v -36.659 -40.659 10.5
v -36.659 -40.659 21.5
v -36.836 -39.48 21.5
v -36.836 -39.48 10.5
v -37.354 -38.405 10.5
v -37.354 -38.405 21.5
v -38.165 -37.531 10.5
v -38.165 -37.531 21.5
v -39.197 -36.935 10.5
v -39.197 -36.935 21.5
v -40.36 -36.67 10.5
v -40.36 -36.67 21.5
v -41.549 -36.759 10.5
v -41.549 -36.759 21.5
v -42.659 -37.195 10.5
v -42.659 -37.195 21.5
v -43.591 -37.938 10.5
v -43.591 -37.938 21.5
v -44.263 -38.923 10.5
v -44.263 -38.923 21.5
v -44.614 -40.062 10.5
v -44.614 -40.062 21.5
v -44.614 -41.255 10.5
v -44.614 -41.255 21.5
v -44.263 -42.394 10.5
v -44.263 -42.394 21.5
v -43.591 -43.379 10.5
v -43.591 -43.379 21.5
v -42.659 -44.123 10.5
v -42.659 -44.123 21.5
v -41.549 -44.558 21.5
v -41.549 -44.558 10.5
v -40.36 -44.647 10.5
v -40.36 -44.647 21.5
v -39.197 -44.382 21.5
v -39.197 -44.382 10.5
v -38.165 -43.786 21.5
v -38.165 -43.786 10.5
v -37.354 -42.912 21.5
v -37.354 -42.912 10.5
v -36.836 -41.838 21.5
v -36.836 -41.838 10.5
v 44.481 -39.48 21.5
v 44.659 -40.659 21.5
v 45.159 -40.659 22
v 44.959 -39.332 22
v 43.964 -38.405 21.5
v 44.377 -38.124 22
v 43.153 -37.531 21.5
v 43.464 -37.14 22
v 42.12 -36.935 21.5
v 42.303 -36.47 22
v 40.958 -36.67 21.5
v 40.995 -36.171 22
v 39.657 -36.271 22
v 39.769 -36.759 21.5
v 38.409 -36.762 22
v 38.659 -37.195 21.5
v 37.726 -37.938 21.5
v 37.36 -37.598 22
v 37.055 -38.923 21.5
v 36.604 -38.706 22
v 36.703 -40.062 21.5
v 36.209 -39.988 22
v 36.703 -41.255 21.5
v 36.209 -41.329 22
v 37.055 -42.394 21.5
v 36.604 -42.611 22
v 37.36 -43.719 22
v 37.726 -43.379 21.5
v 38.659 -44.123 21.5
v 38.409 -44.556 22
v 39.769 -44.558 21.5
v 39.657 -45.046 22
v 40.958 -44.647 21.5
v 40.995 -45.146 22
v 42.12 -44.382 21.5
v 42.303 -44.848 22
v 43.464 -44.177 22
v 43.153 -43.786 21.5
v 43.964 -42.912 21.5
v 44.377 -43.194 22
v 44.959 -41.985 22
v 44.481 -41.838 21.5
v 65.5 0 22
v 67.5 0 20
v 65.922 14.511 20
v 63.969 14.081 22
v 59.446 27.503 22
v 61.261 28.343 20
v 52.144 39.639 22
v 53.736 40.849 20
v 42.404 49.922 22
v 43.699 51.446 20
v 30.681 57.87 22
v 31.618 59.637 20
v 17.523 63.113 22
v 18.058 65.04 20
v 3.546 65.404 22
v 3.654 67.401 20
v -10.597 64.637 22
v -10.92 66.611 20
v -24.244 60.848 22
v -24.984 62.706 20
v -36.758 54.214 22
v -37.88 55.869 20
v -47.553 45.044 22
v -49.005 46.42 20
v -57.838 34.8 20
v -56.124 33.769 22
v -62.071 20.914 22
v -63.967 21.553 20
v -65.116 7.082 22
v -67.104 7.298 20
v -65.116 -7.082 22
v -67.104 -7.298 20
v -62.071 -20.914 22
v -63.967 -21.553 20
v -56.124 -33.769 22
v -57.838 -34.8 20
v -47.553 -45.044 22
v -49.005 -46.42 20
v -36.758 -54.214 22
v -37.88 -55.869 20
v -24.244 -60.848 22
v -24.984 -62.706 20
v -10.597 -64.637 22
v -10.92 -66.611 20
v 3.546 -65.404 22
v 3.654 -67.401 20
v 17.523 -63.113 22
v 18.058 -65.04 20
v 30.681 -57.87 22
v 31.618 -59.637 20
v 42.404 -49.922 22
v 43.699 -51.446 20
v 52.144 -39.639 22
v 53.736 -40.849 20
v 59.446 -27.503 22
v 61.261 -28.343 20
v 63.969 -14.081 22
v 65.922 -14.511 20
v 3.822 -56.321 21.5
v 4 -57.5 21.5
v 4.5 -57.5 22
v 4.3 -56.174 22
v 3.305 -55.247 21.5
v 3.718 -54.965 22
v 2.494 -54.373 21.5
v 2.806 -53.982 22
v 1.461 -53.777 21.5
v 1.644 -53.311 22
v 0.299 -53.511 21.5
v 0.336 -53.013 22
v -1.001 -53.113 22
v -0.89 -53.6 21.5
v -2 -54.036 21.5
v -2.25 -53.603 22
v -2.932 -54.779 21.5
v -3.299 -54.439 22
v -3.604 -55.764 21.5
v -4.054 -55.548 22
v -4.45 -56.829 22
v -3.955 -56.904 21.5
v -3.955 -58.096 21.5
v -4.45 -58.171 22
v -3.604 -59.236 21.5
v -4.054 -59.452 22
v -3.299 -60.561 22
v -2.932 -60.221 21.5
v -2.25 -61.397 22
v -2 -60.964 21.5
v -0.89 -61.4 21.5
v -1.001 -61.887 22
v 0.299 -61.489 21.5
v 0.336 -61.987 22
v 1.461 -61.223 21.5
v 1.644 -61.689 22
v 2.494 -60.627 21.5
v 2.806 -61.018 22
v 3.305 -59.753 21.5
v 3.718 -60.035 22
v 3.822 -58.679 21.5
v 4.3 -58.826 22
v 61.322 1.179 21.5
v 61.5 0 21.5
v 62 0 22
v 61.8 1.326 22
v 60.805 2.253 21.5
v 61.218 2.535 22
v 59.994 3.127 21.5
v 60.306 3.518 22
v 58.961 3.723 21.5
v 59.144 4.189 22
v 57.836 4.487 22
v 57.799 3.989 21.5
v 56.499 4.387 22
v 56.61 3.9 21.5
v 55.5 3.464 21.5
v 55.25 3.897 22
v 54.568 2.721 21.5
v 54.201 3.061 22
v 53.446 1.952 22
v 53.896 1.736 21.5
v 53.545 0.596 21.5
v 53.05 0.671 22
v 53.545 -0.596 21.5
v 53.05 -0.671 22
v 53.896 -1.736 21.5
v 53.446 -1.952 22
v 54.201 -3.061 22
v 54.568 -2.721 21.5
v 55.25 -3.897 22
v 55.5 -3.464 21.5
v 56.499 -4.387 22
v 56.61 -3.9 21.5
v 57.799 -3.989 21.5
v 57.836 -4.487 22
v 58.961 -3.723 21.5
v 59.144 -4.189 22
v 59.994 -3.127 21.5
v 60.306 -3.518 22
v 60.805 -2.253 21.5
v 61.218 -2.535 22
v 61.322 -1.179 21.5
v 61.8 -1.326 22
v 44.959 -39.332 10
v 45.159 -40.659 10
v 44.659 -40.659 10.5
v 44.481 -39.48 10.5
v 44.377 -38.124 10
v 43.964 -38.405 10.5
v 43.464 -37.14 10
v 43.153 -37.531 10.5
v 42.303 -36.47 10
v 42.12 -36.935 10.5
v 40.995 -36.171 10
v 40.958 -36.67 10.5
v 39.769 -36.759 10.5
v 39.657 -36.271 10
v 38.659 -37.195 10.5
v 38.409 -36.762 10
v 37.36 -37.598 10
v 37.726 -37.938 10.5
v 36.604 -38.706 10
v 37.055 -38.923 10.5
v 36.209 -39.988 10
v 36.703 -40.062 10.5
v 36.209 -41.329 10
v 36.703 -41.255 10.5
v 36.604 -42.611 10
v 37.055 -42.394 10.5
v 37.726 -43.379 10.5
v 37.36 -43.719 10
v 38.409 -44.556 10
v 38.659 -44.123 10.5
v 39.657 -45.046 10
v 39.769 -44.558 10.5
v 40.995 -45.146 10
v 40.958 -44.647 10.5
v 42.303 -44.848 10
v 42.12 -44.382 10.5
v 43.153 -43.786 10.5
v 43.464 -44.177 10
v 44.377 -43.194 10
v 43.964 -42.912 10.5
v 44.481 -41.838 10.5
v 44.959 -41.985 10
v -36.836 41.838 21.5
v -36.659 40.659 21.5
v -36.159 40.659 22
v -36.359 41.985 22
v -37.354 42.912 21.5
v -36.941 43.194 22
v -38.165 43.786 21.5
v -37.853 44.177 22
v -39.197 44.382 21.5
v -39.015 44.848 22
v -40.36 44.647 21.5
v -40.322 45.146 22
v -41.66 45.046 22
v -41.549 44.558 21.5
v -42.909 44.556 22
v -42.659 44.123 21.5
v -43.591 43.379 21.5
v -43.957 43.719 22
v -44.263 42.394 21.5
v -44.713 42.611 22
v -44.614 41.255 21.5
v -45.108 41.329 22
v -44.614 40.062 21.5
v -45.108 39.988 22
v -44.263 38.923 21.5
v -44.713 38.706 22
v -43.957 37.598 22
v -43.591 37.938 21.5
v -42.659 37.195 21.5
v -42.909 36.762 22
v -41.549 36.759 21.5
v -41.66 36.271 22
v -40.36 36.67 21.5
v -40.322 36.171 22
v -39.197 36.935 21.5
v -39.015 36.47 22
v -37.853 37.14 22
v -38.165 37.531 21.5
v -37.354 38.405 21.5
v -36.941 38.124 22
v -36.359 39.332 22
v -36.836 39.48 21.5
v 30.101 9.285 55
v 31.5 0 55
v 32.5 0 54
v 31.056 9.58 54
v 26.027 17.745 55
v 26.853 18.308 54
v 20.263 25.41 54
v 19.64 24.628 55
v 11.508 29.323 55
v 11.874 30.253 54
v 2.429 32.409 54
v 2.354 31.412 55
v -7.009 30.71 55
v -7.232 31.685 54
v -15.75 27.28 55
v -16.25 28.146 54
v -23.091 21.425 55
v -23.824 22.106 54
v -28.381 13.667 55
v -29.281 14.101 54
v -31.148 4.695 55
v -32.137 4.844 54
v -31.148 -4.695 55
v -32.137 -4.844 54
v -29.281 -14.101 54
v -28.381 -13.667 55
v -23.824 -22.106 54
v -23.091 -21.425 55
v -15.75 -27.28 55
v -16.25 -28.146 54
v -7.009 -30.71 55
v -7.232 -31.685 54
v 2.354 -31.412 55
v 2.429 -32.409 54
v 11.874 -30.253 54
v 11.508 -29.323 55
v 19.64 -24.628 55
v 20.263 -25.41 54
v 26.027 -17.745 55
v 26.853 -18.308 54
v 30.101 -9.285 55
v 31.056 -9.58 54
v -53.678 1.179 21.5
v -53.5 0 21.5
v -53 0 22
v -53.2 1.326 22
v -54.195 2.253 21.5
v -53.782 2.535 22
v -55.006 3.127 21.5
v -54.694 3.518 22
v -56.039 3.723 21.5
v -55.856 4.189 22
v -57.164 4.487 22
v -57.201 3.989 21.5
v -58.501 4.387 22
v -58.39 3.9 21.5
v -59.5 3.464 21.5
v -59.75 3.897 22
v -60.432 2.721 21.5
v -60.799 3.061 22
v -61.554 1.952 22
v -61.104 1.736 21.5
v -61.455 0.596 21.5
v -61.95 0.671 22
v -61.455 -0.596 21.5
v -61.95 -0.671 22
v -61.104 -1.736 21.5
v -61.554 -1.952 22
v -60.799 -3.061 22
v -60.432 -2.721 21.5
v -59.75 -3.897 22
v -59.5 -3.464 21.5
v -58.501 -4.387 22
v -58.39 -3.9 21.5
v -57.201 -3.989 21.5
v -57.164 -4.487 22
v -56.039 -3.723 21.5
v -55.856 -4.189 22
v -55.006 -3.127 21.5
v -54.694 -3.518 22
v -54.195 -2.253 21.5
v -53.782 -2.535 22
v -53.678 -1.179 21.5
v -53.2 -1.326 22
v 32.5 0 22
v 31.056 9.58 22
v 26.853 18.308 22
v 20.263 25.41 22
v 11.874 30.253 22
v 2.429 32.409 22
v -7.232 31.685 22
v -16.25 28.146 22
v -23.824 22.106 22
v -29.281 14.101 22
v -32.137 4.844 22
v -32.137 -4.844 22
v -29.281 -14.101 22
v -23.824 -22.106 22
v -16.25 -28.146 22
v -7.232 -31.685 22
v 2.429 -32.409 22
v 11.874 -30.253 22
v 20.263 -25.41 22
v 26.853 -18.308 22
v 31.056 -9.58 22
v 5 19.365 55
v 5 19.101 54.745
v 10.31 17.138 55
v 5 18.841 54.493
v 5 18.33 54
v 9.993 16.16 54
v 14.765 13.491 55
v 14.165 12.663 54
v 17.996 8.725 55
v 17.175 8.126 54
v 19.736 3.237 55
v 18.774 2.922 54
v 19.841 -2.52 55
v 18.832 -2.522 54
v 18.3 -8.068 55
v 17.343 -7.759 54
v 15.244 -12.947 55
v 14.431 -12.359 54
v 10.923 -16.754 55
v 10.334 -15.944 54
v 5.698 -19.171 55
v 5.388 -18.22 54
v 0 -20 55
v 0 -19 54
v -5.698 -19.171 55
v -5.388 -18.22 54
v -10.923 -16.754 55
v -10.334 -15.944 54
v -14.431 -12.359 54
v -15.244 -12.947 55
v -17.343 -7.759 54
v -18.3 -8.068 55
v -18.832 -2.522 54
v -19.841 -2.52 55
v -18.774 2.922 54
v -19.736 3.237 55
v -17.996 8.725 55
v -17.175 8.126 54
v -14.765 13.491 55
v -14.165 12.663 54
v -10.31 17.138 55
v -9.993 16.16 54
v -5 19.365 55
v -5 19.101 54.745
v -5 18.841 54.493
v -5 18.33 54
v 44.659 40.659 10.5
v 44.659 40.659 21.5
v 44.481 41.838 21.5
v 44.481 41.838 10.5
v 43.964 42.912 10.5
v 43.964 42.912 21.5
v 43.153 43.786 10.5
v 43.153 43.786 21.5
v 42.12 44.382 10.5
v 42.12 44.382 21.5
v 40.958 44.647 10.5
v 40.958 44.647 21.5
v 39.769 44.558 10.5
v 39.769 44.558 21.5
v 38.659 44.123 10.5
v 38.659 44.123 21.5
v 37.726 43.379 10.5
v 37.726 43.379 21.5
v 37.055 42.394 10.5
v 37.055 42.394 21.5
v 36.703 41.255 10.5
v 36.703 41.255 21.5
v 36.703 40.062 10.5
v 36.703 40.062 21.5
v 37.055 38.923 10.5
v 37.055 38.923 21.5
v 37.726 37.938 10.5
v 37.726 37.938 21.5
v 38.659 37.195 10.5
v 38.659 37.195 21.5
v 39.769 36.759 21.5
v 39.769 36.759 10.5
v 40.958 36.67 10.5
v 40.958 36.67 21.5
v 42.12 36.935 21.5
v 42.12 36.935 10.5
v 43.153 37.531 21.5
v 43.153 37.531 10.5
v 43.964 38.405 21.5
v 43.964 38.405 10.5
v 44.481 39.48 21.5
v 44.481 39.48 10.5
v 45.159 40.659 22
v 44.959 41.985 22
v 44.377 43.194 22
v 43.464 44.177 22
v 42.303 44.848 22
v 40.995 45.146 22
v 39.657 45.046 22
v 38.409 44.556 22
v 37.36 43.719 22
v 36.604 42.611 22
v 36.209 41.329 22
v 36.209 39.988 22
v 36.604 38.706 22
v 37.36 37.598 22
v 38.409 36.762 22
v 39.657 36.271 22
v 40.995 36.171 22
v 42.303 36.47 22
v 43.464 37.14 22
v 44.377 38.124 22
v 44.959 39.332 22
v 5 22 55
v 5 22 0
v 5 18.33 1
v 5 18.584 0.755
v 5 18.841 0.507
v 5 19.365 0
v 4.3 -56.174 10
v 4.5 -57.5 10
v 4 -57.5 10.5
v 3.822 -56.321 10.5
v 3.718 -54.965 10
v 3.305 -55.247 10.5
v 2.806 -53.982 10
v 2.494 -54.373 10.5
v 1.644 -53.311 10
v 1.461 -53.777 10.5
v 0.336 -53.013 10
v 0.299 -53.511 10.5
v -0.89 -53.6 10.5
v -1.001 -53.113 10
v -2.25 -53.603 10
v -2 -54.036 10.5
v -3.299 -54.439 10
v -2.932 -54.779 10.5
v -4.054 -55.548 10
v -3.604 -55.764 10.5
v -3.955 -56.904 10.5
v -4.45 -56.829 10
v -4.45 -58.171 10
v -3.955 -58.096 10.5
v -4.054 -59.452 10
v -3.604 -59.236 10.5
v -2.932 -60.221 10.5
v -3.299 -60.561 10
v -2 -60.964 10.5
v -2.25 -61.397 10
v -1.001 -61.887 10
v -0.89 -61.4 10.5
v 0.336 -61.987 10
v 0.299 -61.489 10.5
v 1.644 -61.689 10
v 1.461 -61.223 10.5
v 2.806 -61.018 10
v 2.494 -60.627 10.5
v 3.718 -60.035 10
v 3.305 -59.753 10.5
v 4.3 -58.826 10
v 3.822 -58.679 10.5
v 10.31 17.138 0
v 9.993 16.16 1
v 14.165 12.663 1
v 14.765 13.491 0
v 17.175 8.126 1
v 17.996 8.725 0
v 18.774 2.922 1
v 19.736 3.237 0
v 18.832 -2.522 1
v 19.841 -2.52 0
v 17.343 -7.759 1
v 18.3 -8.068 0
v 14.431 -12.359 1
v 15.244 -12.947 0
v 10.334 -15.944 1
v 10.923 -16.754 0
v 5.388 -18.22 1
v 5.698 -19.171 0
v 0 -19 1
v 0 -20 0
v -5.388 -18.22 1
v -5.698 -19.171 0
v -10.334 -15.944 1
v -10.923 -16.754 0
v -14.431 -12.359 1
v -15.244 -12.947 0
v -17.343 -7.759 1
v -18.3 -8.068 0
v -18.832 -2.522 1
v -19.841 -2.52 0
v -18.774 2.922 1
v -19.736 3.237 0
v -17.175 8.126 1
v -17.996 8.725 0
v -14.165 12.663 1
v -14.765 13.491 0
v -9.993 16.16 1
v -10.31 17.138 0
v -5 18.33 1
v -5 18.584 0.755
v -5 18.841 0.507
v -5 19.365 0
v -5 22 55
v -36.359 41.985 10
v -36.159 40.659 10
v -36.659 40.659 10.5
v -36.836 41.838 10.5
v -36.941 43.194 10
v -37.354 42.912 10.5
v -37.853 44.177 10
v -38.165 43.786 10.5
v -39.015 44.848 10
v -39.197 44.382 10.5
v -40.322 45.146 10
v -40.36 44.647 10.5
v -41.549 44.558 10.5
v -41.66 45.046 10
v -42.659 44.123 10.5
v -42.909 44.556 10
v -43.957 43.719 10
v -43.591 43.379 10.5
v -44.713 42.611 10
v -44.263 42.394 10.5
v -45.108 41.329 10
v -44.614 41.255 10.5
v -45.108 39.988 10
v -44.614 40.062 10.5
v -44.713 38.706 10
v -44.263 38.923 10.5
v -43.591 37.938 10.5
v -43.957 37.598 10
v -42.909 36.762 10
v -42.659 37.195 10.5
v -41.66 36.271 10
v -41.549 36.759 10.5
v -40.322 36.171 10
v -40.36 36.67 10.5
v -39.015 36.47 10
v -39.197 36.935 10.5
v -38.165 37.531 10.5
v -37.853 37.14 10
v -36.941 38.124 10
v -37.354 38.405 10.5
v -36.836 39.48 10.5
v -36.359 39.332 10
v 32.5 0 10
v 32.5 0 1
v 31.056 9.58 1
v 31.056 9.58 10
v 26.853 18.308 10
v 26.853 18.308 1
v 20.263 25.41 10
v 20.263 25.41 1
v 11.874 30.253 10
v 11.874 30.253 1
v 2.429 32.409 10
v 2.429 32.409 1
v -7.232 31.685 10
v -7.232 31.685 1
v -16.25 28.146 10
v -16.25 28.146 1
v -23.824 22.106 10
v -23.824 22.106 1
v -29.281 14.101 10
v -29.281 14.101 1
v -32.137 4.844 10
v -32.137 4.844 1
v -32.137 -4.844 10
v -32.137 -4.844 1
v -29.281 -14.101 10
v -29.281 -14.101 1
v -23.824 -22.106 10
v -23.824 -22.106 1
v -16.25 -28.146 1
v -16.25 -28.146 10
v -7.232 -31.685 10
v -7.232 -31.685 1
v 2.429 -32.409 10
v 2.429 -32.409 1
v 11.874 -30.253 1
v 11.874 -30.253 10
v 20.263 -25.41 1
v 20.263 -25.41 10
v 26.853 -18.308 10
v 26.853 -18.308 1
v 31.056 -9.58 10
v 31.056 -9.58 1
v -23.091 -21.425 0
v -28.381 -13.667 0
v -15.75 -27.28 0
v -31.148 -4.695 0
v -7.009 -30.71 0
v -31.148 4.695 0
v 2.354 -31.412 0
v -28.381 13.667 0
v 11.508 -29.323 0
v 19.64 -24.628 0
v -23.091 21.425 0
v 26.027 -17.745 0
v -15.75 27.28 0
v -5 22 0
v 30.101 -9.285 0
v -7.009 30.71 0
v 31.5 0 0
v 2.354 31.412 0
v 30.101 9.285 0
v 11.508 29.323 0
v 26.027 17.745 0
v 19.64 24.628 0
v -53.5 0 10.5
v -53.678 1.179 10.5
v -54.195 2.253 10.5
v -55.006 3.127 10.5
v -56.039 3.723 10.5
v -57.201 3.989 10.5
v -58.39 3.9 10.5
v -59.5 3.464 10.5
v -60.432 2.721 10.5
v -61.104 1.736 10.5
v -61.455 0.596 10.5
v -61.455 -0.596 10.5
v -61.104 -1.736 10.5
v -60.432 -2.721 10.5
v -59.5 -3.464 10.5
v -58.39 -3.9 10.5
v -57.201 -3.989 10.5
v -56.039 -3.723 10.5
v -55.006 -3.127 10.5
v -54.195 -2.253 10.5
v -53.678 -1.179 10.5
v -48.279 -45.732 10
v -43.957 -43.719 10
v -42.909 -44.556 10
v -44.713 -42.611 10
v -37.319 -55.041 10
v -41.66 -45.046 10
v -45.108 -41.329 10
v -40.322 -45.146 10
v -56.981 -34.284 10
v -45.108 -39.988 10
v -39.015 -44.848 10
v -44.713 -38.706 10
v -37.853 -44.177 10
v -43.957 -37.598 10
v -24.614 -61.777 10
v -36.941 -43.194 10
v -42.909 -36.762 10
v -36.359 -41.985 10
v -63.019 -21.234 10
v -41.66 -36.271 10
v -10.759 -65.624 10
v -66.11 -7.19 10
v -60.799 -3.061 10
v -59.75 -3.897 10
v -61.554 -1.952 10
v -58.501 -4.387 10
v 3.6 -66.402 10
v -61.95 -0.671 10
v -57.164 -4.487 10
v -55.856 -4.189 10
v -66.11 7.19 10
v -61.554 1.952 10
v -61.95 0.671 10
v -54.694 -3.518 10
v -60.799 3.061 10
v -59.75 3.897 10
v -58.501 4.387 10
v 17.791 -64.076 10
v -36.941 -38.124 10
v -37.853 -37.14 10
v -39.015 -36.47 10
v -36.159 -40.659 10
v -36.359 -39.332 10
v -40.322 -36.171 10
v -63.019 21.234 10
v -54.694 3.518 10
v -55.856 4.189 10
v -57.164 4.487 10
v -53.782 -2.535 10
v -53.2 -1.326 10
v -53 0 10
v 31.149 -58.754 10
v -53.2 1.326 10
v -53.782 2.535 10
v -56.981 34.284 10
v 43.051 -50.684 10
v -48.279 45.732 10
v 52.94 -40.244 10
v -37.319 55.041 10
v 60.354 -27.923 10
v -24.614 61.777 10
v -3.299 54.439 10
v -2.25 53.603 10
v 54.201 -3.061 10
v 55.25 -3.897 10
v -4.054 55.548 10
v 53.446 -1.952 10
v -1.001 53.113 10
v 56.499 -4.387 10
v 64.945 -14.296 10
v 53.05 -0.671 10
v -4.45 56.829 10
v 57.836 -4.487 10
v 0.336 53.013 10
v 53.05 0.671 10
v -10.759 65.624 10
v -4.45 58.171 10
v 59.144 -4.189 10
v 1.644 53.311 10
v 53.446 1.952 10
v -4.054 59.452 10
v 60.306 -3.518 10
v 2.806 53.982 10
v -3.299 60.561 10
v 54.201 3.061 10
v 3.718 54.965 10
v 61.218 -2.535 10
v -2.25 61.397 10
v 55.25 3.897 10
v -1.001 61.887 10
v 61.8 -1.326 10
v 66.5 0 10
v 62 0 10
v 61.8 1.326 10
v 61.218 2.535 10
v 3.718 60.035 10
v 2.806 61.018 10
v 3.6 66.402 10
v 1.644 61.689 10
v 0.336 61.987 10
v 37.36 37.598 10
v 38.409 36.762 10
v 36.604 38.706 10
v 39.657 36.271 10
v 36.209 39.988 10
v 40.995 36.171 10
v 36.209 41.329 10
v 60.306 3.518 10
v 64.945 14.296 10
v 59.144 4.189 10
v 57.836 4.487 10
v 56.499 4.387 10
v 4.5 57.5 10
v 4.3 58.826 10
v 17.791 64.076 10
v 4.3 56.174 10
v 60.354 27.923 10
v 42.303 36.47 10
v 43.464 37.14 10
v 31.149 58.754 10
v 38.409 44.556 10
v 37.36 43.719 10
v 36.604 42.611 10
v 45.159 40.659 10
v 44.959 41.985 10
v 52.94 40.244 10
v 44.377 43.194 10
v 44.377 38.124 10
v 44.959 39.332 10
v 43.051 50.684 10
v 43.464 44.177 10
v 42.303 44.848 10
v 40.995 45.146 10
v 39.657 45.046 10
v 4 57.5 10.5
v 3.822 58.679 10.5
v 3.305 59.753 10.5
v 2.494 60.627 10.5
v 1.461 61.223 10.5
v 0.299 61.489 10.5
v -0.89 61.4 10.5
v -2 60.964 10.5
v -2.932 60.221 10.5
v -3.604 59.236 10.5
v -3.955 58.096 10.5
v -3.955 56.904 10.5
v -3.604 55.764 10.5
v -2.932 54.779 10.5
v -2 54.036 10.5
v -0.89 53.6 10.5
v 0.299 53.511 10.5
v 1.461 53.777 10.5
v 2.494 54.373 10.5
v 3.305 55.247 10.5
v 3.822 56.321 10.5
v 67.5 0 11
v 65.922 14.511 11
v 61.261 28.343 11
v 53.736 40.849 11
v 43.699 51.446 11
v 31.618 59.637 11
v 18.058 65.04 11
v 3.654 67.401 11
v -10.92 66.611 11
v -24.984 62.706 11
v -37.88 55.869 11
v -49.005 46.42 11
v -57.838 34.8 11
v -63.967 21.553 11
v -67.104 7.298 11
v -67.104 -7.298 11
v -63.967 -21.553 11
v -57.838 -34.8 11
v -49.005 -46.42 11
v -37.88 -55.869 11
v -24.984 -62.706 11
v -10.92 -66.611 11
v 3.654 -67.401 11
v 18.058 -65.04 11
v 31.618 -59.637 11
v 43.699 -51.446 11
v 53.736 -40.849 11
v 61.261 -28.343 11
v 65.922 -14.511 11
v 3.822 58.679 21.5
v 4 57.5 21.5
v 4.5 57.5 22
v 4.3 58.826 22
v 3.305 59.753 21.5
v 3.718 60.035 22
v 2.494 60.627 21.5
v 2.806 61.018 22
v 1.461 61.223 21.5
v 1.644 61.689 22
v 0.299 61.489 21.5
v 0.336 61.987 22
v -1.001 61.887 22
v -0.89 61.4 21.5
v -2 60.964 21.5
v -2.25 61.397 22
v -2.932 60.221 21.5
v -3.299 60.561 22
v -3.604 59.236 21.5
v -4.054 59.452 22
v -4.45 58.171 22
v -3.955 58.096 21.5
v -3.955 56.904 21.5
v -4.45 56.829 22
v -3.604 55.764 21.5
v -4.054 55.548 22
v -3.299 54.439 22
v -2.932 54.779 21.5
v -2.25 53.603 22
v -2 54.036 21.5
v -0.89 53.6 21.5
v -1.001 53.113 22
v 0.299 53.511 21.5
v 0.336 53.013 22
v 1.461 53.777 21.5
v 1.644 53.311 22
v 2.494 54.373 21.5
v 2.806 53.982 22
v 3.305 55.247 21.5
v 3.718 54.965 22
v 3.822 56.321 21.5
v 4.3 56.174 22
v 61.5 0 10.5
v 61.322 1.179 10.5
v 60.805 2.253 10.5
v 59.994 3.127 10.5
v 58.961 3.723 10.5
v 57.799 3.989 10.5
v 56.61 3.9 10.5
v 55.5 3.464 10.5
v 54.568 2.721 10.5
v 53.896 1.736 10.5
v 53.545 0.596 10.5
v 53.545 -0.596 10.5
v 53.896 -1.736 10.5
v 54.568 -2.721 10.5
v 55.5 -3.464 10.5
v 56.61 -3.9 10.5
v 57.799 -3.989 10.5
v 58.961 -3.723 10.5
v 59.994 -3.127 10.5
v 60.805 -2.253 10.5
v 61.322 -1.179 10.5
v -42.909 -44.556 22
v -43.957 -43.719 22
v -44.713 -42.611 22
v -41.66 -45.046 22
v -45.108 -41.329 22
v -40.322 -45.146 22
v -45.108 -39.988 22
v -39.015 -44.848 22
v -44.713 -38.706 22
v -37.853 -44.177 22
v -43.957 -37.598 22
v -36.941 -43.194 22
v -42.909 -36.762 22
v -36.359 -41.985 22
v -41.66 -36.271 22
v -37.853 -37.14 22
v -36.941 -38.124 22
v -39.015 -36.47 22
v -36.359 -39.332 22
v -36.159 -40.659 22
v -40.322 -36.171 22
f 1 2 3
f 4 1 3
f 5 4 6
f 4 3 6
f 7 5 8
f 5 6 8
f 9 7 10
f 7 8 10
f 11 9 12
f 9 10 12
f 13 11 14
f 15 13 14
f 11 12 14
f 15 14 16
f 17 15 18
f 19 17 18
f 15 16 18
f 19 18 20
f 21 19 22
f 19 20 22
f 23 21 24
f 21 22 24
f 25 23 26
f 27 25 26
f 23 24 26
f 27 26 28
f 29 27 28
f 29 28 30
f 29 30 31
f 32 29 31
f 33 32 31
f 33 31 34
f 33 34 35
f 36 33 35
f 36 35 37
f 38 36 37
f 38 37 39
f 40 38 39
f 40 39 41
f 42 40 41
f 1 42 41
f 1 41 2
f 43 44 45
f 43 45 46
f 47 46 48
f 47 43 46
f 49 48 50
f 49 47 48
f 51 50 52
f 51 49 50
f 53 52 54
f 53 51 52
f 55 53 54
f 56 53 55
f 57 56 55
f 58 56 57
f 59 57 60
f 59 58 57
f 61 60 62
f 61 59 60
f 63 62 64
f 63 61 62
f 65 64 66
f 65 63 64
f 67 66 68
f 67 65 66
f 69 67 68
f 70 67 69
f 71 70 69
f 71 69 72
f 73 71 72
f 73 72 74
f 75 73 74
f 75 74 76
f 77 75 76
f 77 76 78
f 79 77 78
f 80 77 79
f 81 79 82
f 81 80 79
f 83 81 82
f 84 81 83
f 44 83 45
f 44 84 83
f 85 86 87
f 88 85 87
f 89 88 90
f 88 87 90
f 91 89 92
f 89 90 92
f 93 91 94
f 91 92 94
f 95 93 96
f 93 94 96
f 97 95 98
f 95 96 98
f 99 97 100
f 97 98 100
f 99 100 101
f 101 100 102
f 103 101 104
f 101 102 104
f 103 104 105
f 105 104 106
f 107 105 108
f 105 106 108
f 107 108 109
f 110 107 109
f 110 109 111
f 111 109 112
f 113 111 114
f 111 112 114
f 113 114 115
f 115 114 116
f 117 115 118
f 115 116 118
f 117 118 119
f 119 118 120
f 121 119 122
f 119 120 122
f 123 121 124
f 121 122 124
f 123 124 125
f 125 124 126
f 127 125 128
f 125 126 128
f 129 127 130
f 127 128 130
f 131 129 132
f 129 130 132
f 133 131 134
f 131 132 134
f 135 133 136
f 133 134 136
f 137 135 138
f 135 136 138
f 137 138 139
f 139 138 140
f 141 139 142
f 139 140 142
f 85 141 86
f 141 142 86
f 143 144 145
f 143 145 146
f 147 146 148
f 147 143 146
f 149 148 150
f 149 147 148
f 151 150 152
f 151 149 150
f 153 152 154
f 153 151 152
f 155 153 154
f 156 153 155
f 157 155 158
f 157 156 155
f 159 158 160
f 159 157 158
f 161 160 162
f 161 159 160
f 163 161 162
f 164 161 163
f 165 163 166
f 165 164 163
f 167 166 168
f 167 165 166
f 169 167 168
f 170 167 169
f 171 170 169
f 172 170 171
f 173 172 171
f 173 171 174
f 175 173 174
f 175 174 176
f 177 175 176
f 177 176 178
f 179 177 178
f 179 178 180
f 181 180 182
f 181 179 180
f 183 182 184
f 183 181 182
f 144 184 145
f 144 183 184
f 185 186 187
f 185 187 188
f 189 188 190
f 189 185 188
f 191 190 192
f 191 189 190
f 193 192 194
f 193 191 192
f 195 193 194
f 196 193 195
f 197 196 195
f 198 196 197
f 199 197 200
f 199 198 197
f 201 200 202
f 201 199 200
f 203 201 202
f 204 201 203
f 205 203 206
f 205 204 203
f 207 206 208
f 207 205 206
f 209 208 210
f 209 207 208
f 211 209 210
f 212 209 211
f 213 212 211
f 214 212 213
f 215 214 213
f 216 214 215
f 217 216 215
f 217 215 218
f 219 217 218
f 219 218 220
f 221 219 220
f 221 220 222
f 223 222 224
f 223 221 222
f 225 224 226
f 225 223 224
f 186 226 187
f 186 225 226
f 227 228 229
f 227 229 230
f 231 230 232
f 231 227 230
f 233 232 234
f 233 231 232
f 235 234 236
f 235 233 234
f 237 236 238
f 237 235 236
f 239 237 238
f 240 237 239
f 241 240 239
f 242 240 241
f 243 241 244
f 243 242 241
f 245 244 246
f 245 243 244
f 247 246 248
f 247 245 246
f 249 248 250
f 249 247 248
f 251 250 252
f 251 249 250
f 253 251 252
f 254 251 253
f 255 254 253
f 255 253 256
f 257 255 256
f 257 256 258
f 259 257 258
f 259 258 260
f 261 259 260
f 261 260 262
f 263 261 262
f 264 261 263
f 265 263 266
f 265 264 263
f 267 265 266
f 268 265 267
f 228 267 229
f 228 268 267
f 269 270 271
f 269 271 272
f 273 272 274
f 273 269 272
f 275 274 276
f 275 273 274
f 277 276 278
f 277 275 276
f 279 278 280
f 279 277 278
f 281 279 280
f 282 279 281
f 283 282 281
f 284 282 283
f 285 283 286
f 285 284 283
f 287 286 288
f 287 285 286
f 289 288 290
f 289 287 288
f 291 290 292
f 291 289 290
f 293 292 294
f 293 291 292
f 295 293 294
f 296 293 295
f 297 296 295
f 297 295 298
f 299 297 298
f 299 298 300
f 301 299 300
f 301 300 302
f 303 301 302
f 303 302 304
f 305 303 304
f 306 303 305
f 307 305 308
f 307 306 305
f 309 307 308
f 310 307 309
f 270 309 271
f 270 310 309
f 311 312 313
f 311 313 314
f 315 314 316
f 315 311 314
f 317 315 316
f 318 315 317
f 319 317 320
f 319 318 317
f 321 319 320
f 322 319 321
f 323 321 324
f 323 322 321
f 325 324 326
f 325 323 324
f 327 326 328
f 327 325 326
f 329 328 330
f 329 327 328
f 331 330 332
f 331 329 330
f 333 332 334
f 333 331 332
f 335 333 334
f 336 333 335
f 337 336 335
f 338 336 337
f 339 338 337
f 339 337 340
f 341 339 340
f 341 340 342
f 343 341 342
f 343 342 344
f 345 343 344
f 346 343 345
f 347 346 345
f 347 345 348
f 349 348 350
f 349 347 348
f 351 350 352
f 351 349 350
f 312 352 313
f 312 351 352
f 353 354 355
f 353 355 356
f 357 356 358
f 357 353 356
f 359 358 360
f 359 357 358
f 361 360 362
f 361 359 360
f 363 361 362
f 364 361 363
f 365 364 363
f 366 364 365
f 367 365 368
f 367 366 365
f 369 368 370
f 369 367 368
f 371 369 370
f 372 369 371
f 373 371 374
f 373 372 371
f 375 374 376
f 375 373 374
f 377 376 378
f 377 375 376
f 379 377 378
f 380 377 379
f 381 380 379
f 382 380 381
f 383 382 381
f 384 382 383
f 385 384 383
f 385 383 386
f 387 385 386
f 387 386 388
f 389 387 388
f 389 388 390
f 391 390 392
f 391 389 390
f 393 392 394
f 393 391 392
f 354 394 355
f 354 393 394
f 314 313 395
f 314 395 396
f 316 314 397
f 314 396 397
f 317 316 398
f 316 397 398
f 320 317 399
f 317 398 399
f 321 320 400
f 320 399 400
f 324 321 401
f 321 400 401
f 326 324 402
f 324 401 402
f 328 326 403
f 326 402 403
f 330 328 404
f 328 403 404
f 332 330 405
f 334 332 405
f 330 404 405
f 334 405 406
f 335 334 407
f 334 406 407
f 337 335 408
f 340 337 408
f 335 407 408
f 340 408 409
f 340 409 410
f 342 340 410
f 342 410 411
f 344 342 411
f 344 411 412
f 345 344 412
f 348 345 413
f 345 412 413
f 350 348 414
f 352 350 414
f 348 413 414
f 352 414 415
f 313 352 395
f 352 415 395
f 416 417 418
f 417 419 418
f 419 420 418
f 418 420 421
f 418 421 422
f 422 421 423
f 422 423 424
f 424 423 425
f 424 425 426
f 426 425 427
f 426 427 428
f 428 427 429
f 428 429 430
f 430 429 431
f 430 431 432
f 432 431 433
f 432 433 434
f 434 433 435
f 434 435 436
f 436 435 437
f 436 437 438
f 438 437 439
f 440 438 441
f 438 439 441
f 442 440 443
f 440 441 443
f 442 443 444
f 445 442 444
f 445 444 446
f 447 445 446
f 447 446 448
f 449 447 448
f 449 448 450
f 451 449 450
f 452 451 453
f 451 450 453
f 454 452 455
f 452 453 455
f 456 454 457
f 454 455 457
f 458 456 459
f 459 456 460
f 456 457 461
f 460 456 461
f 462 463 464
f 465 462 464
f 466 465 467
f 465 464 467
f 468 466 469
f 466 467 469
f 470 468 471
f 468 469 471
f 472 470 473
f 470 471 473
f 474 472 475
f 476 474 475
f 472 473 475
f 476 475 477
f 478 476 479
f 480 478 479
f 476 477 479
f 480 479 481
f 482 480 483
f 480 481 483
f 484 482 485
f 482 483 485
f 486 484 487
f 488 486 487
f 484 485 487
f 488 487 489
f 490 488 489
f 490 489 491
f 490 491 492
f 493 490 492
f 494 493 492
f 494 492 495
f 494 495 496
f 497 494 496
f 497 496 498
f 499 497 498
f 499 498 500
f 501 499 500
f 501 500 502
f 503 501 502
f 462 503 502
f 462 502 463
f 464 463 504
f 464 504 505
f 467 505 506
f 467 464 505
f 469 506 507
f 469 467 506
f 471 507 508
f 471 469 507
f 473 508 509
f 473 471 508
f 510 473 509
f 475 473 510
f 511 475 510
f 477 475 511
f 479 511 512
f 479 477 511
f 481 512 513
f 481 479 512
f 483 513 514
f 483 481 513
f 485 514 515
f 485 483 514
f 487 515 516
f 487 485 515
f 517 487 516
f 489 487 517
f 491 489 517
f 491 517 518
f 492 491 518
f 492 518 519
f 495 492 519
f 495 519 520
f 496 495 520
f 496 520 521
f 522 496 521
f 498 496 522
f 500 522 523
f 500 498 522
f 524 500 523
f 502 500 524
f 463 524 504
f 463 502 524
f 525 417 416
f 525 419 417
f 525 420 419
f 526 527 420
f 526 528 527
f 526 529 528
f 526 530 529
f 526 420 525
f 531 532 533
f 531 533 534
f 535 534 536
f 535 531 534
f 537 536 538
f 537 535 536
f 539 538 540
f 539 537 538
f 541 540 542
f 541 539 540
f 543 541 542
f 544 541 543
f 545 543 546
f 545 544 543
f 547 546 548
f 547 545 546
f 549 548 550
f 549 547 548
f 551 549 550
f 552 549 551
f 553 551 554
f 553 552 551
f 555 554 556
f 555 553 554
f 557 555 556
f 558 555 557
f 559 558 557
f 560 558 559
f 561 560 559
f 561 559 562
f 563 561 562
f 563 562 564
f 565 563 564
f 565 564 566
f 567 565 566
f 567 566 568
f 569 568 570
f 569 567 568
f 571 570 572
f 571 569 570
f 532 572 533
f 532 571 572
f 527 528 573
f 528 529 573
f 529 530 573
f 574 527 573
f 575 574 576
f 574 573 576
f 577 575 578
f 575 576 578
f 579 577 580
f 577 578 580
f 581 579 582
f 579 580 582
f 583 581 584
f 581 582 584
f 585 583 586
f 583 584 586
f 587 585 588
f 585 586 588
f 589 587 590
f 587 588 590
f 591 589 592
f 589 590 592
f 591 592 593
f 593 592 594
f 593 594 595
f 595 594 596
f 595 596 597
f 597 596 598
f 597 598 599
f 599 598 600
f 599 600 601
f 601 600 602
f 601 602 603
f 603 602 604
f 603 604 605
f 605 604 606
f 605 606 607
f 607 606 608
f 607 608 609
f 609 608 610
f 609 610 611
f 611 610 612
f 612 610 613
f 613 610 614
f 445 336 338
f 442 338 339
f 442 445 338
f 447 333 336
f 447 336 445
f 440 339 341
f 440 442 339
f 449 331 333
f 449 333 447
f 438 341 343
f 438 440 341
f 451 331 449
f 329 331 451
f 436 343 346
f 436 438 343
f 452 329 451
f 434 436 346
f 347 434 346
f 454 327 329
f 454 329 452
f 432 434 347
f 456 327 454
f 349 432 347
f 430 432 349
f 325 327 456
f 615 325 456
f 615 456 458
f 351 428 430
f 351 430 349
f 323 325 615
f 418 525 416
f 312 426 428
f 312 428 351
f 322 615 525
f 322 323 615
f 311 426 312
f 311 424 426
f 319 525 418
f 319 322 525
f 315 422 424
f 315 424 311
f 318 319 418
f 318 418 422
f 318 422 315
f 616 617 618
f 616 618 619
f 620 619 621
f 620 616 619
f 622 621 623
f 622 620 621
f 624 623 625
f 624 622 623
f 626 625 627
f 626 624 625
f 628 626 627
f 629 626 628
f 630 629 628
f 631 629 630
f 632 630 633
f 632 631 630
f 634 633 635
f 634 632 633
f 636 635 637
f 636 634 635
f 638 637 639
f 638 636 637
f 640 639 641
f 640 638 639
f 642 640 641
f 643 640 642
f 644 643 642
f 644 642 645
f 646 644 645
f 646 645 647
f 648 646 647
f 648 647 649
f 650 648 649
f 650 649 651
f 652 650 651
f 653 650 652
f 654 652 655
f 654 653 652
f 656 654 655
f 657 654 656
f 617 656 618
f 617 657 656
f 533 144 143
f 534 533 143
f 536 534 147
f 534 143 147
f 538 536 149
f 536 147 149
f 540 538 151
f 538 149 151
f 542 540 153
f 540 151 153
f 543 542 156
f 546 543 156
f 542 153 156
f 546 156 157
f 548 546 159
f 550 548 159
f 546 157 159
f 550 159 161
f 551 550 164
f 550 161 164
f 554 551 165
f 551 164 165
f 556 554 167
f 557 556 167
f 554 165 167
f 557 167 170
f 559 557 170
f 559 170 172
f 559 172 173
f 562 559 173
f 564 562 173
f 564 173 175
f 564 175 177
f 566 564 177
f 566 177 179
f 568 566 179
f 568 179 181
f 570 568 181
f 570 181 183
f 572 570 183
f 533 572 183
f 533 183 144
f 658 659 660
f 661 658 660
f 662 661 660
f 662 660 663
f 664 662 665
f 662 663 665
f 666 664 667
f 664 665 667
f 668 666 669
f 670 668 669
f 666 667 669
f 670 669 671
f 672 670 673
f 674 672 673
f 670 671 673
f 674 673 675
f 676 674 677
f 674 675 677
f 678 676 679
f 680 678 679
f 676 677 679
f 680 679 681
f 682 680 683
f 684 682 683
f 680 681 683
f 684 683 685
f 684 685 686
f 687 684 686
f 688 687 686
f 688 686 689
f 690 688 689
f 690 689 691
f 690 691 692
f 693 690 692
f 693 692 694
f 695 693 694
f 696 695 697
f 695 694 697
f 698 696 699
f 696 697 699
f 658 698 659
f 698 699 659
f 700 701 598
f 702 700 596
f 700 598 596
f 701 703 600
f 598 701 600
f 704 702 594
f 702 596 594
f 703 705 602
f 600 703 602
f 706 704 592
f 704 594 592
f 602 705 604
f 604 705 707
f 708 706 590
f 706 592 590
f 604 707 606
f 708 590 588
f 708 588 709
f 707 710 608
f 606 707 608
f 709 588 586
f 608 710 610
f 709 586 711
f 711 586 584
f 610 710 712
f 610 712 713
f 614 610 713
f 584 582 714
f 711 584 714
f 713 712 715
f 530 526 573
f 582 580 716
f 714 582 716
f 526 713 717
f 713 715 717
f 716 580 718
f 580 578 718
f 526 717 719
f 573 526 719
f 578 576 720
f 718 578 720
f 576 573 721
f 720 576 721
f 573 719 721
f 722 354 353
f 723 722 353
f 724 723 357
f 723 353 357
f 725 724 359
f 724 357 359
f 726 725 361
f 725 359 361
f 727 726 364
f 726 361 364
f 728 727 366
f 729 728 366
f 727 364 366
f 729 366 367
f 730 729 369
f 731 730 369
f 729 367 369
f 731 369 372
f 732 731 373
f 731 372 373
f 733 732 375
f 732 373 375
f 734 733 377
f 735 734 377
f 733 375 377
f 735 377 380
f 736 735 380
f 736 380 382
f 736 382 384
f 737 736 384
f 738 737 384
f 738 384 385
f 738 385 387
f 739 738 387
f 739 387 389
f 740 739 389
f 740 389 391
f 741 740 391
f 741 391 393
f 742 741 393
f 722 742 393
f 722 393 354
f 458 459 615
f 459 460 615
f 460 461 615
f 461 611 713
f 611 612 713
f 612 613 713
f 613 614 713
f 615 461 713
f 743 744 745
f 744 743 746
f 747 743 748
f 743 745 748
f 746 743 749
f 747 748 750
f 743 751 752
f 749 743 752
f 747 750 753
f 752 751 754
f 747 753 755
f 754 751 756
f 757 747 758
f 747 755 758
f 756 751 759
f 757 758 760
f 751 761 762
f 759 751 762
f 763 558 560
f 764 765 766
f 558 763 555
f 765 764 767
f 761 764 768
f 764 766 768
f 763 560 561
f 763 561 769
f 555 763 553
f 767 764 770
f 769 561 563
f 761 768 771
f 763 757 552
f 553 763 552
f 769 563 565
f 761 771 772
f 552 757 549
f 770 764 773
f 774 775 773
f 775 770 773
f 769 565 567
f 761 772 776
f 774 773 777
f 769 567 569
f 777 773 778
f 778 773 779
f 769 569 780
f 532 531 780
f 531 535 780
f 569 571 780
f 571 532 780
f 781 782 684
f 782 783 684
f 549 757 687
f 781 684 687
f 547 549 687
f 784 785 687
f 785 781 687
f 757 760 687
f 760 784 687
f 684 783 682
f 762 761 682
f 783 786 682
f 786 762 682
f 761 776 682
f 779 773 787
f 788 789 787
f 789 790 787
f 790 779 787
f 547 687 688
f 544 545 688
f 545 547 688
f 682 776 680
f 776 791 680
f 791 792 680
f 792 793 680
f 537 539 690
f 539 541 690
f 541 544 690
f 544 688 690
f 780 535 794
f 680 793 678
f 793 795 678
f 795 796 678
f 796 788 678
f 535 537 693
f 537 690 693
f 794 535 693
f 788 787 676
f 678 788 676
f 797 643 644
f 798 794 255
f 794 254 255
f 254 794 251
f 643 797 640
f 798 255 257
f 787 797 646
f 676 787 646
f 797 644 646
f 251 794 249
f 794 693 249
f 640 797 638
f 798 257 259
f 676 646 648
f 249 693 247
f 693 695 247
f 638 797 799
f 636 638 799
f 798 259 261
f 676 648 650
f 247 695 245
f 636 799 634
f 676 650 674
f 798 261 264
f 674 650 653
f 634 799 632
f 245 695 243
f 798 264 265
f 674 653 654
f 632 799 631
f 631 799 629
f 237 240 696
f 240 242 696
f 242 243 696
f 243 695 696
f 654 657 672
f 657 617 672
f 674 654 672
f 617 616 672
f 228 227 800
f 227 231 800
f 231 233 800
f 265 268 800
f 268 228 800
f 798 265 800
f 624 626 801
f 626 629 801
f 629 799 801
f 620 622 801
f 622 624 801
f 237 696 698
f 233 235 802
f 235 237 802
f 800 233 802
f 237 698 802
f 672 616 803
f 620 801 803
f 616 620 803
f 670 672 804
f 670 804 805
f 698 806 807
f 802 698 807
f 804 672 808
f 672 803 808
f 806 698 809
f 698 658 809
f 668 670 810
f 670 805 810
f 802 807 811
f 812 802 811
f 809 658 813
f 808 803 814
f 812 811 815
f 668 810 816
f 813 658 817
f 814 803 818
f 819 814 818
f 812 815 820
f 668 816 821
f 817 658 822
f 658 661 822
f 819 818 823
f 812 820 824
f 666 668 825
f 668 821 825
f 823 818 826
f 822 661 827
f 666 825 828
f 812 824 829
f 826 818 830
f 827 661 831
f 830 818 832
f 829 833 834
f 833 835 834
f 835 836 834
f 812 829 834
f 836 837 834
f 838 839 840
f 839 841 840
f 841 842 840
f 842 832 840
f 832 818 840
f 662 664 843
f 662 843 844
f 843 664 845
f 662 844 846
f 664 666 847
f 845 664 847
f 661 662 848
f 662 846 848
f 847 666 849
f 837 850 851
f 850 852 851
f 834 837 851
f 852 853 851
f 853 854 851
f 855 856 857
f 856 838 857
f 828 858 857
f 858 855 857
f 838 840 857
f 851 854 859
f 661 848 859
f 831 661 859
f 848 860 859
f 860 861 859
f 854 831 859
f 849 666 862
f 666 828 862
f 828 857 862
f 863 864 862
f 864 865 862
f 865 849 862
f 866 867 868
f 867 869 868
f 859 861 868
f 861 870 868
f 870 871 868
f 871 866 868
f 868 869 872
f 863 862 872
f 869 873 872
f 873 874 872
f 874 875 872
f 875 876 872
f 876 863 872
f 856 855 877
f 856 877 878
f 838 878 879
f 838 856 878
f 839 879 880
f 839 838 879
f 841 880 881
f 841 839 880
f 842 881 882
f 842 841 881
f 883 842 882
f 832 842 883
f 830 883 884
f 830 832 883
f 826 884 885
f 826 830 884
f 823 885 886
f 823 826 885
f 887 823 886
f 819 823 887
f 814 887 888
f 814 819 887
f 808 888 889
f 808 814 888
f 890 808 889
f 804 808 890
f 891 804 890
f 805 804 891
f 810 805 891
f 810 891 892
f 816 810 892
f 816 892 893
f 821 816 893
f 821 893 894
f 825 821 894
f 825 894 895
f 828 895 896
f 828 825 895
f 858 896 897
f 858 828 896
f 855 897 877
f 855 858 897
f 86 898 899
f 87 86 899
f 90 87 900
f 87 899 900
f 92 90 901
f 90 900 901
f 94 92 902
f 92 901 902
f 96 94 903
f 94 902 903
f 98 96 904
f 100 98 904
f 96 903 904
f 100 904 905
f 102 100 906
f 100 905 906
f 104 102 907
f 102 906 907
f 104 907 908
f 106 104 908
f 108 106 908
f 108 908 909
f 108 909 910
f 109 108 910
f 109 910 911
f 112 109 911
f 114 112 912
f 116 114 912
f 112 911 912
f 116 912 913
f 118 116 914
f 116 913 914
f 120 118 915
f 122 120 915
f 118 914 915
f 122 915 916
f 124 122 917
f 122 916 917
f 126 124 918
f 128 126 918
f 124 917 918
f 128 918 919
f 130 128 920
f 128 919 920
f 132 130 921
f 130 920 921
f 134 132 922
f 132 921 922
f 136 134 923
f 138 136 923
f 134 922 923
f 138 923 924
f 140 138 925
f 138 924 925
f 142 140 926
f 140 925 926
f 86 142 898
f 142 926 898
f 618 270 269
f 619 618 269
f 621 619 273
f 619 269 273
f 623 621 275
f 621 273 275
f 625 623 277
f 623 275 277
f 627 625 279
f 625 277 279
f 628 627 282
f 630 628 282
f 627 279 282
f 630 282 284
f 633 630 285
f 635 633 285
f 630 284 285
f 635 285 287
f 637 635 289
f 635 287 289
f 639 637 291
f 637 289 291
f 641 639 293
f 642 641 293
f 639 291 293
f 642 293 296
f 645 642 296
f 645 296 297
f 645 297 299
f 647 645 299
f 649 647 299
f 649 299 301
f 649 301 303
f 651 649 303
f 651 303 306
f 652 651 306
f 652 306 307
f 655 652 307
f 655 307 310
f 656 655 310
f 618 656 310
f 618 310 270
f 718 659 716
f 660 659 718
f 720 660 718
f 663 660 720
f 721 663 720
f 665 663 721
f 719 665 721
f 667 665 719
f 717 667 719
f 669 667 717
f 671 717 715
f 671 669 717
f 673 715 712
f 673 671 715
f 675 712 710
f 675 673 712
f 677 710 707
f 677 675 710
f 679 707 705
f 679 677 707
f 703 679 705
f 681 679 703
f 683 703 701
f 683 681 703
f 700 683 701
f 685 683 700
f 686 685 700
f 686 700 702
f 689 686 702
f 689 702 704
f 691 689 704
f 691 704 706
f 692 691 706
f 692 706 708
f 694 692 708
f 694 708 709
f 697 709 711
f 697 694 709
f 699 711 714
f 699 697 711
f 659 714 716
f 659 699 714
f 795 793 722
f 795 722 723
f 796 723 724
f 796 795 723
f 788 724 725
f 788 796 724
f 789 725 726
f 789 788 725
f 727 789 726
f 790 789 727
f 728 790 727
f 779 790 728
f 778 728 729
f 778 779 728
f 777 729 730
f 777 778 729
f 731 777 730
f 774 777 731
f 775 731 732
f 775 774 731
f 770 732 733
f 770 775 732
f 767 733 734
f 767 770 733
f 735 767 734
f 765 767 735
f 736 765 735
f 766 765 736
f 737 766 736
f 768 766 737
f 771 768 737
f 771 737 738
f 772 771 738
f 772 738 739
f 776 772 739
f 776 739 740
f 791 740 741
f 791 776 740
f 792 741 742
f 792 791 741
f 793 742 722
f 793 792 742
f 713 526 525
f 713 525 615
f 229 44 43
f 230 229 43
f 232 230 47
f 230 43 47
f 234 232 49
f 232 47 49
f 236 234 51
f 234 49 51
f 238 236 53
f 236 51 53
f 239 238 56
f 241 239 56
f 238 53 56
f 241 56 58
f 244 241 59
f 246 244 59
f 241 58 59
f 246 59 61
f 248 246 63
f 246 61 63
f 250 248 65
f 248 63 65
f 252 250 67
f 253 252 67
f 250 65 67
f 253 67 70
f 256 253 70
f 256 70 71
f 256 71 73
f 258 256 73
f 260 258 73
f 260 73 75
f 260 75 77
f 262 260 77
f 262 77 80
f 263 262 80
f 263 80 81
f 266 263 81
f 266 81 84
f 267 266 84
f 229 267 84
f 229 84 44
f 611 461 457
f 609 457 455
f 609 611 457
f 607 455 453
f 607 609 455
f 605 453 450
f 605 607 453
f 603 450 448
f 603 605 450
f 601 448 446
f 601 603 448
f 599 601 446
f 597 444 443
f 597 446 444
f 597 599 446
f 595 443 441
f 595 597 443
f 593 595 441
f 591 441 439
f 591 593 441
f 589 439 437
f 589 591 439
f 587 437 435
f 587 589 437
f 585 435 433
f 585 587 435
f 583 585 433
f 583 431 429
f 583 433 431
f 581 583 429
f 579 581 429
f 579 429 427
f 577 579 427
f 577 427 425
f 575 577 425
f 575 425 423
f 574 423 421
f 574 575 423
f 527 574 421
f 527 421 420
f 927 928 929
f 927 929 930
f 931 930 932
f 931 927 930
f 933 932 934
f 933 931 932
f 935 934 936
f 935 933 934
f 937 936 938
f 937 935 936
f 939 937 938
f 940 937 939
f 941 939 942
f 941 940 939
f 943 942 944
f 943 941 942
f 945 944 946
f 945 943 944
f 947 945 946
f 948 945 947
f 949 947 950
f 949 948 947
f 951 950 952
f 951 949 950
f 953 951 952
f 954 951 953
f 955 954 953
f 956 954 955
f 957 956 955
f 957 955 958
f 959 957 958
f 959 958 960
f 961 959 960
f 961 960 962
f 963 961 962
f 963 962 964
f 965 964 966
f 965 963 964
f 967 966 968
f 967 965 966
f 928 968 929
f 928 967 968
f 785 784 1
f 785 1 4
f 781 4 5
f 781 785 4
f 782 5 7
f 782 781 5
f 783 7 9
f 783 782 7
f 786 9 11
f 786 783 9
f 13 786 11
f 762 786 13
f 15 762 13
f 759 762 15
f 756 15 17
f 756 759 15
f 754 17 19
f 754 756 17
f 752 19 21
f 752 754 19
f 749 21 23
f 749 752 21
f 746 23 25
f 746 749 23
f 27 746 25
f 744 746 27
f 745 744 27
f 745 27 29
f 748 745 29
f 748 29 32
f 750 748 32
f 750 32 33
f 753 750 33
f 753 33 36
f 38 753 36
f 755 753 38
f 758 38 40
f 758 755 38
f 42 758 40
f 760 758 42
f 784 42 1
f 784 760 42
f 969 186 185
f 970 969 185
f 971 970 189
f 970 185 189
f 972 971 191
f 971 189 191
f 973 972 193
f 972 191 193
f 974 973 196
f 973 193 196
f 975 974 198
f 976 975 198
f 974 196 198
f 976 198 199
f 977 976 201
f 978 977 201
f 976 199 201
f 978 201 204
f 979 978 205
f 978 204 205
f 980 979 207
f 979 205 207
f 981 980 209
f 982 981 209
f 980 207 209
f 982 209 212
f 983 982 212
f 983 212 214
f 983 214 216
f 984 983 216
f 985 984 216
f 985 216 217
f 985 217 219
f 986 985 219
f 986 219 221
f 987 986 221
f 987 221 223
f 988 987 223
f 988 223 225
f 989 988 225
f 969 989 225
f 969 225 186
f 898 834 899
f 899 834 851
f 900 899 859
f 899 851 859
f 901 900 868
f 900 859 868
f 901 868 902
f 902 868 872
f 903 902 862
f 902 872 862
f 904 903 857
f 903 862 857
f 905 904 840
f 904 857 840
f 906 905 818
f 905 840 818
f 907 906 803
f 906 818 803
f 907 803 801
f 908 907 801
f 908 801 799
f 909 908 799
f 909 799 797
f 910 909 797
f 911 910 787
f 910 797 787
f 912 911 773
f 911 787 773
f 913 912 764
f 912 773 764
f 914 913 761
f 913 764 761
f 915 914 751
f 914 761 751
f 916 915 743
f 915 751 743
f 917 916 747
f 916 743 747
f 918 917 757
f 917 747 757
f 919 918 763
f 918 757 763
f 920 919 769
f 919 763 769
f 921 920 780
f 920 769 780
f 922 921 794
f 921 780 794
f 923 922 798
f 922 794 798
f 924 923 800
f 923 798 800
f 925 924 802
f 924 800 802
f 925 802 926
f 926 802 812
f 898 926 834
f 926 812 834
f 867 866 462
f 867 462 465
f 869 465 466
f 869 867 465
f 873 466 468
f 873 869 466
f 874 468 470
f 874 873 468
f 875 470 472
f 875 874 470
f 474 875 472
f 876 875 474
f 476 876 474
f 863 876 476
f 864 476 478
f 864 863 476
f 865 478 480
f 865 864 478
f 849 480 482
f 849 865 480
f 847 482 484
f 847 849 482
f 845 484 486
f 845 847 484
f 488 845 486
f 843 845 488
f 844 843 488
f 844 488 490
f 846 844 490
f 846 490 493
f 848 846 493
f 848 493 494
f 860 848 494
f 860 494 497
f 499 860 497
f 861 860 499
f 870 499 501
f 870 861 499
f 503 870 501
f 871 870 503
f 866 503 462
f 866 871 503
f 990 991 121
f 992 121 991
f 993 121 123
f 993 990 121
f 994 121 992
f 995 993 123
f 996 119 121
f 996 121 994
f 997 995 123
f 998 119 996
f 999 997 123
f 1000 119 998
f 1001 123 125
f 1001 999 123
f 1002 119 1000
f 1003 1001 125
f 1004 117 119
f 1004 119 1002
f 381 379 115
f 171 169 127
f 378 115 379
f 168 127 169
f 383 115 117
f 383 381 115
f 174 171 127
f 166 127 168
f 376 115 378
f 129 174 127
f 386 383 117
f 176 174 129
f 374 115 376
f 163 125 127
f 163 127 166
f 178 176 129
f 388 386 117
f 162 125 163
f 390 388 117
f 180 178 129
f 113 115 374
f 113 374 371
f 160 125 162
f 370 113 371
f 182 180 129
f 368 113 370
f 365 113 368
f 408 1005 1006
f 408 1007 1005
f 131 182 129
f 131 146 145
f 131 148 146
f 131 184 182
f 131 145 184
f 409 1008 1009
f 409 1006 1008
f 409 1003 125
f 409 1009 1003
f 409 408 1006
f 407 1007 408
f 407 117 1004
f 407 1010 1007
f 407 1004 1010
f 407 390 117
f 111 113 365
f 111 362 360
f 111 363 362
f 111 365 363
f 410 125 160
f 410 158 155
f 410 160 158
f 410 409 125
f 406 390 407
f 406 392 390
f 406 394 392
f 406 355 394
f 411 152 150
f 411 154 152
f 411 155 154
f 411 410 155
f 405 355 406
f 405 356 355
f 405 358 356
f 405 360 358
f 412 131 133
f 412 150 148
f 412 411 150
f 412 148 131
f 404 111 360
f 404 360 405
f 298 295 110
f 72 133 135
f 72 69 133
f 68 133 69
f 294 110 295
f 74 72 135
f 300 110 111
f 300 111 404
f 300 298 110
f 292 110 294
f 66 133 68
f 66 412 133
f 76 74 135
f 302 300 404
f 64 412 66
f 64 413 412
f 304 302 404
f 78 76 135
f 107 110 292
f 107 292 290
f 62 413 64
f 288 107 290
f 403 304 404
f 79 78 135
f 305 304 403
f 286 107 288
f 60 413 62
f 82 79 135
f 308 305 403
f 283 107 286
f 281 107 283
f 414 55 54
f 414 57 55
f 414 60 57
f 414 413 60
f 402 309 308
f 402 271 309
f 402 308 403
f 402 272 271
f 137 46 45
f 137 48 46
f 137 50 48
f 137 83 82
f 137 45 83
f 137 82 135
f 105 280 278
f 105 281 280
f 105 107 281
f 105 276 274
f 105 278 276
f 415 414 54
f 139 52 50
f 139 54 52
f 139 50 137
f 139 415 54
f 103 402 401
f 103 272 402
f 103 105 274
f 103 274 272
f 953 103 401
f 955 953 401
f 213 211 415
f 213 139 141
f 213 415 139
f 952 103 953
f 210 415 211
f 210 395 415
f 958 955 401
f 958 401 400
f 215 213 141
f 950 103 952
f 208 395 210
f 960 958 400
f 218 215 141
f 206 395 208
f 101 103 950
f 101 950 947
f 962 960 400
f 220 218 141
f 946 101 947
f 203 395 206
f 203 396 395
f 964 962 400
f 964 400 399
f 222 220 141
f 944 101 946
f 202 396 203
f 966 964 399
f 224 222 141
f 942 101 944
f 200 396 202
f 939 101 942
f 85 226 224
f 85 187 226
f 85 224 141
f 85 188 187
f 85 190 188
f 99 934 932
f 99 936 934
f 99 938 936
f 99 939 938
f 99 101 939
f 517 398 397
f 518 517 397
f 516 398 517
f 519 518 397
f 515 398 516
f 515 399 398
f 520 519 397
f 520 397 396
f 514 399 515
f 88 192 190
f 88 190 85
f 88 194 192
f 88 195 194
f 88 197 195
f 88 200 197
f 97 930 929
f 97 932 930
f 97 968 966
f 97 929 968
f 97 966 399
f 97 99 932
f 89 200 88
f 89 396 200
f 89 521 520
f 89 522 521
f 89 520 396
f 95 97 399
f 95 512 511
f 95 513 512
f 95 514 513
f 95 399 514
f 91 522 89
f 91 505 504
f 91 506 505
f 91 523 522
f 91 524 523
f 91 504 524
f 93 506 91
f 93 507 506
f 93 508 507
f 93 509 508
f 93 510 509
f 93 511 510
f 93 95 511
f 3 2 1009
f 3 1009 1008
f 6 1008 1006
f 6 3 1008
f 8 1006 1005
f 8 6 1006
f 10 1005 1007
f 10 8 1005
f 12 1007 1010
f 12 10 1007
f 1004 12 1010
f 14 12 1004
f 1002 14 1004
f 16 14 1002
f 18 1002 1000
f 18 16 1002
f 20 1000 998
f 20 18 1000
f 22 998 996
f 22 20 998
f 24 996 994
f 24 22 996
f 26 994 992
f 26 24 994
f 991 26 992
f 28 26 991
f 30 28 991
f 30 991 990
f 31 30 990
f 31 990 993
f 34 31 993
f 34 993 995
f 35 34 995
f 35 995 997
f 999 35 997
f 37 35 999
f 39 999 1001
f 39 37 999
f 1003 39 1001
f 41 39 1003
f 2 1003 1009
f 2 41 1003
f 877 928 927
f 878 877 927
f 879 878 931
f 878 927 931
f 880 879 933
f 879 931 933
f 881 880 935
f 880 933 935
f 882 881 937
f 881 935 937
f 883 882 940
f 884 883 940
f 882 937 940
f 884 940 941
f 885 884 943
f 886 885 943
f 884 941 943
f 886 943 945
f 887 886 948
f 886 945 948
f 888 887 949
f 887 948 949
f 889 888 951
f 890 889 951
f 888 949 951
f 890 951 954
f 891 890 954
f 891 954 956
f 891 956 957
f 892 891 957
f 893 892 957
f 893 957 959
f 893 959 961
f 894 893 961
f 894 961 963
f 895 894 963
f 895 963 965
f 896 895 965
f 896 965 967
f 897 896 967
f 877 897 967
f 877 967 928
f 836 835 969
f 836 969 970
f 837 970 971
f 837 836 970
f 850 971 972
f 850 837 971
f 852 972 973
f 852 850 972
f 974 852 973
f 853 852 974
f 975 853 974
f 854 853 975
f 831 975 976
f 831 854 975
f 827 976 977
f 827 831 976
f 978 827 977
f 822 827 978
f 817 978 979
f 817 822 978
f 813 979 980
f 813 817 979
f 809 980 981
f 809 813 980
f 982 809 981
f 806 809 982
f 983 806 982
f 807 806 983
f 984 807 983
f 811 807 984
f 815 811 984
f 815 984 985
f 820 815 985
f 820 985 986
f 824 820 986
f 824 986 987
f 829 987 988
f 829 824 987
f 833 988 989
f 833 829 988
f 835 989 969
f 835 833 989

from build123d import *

# Parameters (mm, degrees)
SKETCH_1_R          = 32.5
EXTRUDE_1_DEPTH     = 10
SKETCH_2_R          = 67.5
EXTRUDE_2_DEPTH     = 12
SKETCH_3_R          = 19
CUT_EXTRUDE_1_DEPTH = 45
SKETCH_4_R          = 32.5
SKETCH_4_R_2        = 19
EXTRUDE_3_DEPTH     = 33
SKETCH_5_W          = 10
SKETCH_5_H          = 9.79155849
CUT_EXTRUDE_2_DEPTH = 111.170322683
SKETCH_6_R          = 4
CUT_EXTRUDE_3_DEPTH = 30
CHAMFER_1_SIZE      = 1
CHAMFER_2_SIZE      = 0.5
CHAMFER_3_SIZE      = 2
CHAMFER_4_SIZE      = 1


with BuildPart() as part:
    # 草图1 → 拉伸1 (new body)
    with BuildSketch(Plane.XY):
        Circle(SKETCH_1_R)
    extrude(amount=EXTRUDE_1_DEPTH)

    # 草图2 → 拉伸2 (add)
    with BuildSketch(Plane.XY.offset(10)):
        Circle(SKETCH_2_R)
    extrude(amount=EXTRUDE_2_DEPTH)

    # 草图3 → 切除-拉伸1 (cut)
    with BuildSketch(Plane.XY.offset(22)):
        Circle(SKETCH_3_R)
    extrude(amount=-CUT_EXTRUDE_1_DEPTH, mode=Mode.SUBTRACT)

    # 草图4 → 拉伸3 (add)
    with BuildSketch(Plane.XY.offset(22)):
        Circle(SKETCH_4_R)
        Circle(SKETCH_4_R_2, mode=Mode.SUBTRACT)
    extrude(amount=EXTRUDE_3_DEPTH)

    # 草图5 → 切除-拉伸2 (cut, through all)
    with BuildSketch(Plane(origin=(0, 0, 0), x_dir=(-1, 0, 0), z_dir=(0, 0, -1))):
        with Locations((0, 17.104220755)):
            Rectangle(SKETCH_5_W, SKETCH_5_H)
    extrude(amount=-CUT_EXTRUDE_2_DEPTH, mode=Mode.SUBTRACT)

    # 草图6 → 切除-拉伸3 (cut)
    with BuildSketch(Plane.XY.offset(22)):
        with Locations((40.658639918, 40.658639918)):
            Circle(SKETCH_6_R)
        with Locations((0, 57.5)):
            Circle(SKETCH_6_R)
        with Locations((57.5, 0)):
            Circle(SKETCH_6_R)
        with Locations((40.658639918, -40.658639918)):
            Circle(SKETCH_6_R)
        with Locations((0, -57.5)):
            Circle(SKETCH_6_R)
        with Locations((-40.658639918, -40.658639918)):
            Circle(SKETCH_6_R)
        with Locations((-57.5, 0)):
            Circle(SKETCH_6_R)
        with Locations((-40.658639918, 40.658639918)):
            Circle(SKETCH_6_R)
    extrude(amount=-CUT_EXTRUDE_3_DEPTH, mode=Mode.SUBTRACT)

    # 倒角1
    chamfer_1_edges = [part.edges().sort_by_distance(p)[0] for p in [
        (-32.5, 0, 55),
        (-32.5, 0, 0),
        (0, -19, 55),
        (-67.5, 0, 10),
    ]]
    chamfer(chamfer_1_edges, length=CHAMFER_1_SIZE)

    # 倒角2
    chamfer_2_edges = [part.edges().sort_by_distance(p)[0] for p in [
        (-4, 57.5, 10),
        (-4, 57.5, 22),
        (36.658639918, 40.658639918, 10),
        (36.658639918, 40.658639918, 22),
        (53.5, 0, 10),
        (53.5, 0, 22),
        (36.658639918, -40.658639918, 10),
        (36.658639918, -40.658639918, 22),
        (-4, -57.5, 10),
        (-4, -57.5, 22),
        (-44.658639918, -40.658639918, 10),
        (-44.658639918, -40.658639918, 22),
        (-61.5, 0, 10),
        (-61.5, 0, 22),
        (-44.658639918, 40.658639918, 10),
        (-44.658639918, 40.658639918, 22),
    ]]
    chamfer(chamfer_2_edges, length=CHAMFER_2_SIZE)

    # 倒角3
    chamfer_3_edges = [part.edges().sort_by_distance(p)[0] for p in [
        (-67.5, 0, 22),
    ]]
    chamfer(chamfer_3_edges, length=CHAMFER_3_SIZE)

    # 倒角4
    chamfer_4_edges = [part.edges().sort_by_distance(p)[0] for p in [
        (0, -19, 0),
    ]]
    chamfer(chamfer_4_edges, length=CHAMFER_4_SIZE)


solid = part.part
